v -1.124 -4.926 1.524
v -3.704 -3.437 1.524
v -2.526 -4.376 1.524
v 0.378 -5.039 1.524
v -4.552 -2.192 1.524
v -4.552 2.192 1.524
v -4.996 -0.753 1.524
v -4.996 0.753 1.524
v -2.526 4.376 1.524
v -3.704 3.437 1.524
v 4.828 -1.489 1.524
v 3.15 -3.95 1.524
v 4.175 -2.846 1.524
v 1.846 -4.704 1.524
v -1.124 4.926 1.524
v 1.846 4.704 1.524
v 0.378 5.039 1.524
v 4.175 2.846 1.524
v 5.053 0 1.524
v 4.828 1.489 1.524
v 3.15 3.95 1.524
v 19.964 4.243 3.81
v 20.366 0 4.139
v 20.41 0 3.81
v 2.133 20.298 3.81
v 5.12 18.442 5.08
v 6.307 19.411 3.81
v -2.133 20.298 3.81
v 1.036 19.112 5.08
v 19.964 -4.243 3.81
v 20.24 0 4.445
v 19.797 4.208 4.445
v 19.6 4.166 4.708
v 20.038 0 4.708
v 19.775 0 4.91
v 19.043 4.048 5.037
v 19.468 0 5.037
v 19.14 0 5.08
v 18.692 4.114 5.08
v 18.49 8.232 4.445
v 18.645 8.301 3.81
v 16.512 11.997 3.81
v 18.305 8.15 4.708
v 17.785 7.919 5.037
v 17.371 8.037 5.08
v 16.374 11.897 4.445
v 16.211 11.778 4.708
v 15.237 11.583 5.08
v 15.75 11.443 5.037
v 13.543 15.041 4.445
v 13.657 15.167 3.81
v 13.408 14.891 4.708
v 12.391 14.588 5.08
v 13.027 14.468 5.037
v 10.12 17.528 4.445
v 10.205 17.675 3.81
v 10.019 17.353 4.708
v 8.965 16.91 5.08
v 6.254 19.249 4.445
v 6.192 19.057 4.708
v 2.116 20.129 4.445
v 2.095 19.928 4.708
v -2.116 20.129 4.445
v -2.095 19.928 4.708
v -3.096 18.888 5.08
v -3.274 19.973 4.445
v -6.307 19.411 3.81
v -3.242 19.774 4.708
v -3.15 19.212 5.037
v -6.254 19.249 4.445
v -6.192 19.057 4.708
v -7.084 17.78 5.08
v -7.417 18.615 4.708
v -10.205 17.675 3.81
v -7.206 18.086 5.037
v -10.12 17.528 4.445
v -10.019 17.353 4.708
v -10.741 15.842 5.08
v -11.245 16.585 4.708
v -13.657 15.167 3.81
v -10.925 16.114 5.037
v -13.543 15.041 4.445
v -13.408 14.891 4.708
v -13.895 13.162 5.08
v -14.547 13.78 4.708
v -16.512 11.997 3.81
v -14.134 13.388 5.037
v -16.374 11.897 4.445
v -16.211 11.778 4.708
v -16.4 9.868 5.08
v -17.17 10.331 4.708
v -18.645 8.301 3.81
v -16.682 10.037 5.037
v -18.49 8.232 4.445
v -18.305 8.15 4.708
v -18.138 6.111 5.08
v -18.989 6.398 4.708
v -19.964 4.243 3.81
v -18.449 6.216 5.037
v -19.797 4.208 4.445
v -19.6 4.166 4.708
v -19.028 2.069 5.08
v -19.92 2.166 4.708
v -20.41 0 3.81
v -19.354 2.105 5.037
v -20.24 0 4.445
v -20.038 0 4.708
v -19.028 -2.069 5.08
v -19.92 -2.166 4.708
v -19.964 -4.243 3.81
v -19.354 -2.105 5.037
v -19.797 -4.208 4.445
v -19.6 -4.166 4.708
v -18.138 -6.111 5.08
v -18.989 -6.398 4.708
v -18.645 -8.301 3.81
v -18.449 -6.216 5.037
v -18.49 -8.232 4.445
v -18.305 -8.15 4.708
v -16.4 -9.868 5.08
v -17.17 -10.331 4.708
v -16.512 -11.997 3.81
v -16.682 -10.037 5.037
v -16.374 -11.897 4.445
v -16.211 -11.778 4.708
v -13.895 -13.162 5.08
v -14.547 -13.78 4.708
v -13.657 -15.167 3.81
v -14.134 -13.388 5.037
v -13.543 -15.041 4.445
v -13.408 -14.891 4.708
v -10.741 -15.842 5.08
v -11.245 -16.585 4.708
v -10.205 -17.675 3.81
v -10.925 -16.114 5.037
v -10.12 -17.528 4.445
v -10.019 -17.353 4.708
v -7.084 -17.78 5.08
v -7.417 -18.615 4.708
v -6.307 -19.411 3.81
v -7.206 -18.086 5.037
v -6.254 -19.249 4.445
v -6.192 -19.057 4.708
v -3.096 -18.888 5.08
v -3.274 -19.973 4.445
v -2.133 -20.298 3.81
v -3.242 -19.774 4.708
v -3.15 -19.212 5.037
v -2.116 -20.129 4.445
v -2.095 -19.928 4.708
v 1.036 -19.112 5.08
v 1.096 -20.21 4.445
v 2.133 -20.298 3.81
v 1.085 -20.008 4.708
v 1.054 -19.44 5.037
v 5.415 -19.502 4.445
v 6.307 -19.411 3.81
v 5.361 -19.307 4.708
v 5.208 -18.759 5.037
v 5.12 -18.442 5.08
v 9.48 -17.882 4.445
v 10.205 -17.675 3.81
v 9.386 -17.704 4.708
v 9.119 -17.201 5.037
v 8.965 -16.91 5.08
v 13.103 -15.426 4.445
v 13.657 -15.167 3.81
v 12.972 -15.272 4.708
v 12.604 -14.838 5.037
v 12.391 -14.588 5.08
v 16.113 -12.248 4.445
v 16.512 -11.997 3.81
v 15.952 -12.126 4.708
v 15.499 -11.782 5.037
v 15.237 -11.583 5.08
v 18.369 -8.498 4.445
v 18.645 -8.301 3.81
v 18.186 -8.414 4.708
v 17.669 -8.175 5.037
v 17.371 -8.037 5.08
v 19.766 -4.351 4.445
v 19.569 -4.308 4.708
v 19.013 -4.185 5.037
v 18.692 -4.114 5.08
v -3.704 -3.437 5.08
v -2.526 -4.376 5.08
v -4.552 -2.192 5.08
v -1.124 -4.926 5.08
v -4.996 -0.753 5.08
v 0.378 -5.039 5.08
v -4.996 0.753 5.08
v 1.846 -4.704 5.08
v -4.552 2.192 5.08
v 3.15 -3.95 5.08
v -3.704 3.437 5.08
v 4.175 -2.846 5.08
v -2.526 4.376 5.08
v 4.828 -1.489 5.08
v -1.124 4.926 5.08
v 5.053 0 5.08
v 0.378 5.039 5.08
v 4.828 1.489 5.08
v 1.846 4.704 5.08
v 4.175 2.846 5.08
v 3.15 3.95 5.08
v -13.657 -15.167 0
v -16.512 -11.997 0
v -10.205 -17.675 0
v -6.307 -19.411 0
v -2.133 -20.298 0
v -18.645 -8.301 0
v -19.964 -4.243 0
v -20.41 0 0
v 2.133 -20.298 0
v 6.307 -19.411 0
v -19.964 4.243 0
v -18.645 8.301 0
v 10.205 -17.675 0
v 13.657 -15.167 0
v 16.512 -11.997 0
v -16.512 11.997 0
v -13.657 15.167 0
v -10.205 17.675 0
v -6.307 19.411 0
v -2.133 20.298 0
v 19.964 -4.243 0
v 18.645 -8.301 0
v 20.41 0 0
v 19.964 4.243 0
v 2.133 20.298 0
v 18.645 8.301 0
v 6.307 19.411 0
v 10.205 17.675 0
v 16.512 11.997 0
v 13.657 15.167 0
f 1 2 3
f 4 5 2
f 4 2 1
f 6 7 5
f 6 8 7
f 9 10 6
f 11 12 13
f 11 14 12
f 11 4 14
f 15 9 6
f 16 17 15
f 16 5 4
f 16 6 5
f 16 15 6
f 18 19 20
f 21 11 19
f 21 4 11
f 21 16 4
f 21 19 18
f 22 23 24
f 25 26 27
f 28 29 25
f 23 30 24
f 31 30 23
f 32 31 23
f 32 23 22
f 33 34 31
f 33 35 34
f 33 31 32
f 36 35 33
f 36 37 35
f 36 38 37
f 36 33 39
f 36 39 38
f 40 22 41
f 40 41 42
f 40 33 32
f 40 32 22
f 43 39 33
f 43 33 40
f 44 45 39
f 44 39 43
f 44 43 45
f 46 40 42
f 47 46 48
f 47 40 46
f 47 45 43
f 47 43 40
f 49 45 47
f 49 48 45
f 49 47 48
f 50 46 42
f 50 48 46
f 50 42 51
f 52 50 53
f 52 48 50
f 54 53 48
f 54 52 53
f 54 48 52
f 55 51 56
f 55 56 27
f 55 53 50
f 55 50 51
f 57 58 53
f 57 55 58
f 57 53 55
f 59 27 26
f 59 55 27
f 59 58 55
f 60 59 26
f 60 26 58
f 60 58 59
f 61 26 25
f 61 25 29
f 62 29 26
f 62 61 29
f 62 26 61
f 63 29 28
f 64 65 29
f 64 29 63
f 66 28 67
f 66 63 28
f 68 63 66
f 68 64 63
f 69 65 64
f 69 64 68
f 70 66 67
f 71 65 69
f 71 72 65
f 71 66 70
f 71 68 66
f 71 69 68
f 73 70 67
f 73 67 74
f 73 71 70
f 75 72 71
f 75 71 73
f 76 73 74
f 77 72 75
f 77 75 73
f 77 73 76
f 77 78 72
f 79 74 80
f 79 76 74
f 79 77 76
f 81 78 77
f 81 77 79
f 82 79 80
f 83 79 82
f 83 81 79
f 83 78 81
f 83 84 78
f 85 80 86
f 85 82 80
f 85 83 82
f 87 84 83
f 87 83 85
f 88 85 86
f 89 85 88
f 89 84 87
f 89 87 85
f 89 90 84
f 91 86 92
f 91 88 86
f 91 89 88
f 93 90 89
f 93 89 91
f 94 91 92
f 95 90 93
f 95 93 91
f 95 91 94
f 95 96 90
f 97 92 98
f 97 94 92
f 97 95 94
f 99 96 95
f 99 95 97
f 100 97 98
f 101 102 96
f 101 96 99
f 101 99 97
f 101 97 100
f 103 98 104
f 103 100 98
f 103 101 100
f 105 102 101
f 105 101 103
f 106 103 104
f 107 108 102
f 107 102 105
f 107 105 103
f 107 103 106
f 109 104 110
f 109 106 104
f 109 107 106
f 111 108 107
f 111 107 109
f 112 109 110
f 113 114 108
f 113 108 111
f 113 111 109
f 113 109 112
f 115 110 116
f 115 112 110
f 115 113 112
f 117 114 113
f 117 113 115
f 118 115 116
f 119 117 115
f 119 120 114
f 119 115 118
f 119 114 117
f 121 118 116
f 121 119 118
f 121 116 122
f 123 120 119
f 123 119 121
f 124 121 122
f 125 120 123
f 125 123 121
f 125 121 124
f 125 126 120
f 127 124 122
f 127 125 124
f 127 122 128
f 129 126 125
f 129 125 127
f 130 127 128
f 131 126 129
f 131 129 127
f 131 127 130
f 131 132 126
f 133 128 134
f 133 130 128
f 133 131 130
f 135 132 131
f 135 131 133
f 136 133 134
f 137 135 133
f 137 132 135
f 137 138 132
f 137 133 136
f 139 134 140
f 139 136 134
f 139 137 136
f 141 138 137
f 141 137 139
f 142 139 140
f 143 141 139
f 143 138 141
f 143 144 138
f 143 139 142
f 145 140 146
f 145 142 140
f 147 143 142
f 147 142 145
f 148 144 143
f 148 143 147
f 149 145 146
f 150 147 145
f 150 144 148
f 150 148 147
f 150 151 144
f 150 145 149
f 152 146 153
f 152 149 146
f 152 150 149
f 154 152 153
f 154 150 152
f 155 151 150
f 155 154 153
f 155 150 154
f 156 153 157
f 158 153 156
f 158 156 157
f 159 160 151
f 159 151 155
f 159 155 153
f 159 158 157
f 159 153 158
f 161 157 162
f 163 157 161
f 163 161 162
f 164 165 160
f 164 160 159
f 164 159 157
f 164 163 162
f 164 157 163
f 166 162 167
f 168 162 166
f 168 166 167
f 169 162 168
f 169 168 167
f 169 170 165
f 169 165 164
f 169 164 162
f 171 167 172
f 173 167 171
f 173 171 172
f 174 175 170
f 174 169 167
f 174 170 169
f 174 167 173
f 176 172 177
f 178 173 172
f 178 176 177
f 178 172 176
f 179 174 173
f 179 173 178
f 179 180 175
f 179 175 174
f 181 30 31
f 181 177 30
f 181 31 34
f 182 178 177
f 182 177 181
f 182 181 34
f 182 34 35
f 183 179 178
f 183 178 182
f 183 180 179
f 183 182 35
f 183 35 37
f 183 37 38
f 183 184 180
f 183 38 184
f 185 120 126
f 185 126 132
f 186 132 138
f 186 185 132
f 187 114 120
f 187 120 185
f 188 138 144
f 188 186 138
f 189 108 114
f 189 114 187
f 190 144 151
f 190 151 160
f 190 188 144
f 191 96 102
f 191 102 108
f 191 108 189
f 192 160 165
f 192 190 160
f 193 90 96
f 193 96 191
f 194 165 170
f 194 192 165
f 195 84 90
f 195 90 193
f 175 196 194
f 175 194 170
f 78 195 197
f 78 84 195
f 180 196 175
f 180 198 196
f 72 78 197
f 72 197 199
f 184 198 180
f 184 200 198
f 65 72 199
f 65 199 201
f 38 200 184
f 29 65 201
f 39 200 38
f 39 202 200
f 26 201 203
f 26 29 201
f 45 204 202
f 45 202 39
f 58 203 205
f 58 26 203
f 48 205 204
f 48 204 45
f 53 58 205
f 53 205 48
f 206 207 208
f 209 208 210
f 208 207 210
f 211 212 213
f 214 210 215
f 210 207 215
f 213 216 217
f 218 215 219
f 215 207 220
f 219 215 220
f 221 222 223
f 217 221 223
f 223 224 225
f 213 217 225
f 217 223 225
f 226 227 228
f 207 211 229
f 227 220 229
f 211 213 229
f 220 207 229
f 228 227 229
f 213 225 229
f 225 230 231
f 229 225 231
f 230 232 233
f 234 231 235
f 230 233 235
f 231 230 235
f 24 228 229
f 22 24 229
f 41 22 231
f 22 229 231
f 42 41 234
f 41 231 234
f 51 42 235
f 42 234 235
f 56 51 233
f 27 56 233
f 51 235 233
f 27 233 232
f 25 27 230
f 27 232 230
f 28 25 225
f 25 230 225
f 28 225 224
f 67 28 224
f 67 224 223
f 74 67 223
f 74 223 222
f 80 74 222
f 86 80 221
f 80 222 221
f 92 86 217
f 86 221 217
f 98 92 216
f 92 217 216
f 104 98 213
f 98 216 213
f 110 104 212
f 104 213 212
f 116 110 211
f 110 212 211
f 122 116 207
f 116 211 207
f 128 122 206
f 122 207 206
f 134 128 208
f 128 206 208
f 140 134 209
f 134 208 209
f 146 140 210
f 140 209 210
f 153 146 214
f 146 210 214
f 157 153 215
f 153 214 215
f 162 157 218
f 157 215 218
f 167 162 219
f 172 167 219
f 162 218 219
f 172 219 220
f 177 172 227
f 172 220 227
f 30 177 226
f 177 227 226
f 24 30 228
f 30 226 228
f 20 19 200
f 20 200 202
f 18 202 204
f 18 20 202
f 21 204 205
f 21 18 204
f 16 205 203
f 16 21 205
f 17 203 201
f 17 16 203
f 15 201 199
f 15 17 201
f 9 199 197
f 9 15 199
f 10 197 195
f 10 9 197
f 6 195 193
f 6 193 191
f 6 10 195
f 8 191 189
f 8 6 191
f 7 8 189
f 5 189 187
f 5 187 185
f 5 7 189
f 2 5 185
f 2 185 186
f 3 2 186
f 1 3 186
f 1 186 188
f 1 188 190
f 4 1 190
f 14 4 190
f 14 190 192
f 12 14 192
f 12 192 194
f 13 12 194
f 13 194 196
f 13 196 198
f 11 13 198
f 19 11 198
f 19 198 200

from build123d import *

# Parameters (mm, degrees)
F1_R     = 20.4097396771
F1_R_2   = 5.0527941738
F2_DEPTH = 5.08
F3_R     = 9.3754452045
F4_DEPTH = 1.524
F6_R     = 1.27


# Not quite as in the source:
# - a feature names something its author has since deleted; it is built from what else it names


with BuildPart() as f2:
    # F1 (on face) → F2 (new body)
    with BuildSketch(Plane.XY):
        Circle(F1_R)
        Circle(F1_R_2, mode=Mode.SUBTRACT)
    extrude(amount=F2_DEPTH)

    # F3 (on Top) → F4 (join)
    with BuildSketch(Plane.XY):
        Circle(F3_R)
    extrude(amount=F4_DEPTH)

    # F6
    f6_edges = [f2.edges().sort_by_distance(p)[0] for p in [
        (-20.40974, 0, 5.08),
    ]]
    fillet(f6_edges, radius=F6_R)


solid = f2.part
